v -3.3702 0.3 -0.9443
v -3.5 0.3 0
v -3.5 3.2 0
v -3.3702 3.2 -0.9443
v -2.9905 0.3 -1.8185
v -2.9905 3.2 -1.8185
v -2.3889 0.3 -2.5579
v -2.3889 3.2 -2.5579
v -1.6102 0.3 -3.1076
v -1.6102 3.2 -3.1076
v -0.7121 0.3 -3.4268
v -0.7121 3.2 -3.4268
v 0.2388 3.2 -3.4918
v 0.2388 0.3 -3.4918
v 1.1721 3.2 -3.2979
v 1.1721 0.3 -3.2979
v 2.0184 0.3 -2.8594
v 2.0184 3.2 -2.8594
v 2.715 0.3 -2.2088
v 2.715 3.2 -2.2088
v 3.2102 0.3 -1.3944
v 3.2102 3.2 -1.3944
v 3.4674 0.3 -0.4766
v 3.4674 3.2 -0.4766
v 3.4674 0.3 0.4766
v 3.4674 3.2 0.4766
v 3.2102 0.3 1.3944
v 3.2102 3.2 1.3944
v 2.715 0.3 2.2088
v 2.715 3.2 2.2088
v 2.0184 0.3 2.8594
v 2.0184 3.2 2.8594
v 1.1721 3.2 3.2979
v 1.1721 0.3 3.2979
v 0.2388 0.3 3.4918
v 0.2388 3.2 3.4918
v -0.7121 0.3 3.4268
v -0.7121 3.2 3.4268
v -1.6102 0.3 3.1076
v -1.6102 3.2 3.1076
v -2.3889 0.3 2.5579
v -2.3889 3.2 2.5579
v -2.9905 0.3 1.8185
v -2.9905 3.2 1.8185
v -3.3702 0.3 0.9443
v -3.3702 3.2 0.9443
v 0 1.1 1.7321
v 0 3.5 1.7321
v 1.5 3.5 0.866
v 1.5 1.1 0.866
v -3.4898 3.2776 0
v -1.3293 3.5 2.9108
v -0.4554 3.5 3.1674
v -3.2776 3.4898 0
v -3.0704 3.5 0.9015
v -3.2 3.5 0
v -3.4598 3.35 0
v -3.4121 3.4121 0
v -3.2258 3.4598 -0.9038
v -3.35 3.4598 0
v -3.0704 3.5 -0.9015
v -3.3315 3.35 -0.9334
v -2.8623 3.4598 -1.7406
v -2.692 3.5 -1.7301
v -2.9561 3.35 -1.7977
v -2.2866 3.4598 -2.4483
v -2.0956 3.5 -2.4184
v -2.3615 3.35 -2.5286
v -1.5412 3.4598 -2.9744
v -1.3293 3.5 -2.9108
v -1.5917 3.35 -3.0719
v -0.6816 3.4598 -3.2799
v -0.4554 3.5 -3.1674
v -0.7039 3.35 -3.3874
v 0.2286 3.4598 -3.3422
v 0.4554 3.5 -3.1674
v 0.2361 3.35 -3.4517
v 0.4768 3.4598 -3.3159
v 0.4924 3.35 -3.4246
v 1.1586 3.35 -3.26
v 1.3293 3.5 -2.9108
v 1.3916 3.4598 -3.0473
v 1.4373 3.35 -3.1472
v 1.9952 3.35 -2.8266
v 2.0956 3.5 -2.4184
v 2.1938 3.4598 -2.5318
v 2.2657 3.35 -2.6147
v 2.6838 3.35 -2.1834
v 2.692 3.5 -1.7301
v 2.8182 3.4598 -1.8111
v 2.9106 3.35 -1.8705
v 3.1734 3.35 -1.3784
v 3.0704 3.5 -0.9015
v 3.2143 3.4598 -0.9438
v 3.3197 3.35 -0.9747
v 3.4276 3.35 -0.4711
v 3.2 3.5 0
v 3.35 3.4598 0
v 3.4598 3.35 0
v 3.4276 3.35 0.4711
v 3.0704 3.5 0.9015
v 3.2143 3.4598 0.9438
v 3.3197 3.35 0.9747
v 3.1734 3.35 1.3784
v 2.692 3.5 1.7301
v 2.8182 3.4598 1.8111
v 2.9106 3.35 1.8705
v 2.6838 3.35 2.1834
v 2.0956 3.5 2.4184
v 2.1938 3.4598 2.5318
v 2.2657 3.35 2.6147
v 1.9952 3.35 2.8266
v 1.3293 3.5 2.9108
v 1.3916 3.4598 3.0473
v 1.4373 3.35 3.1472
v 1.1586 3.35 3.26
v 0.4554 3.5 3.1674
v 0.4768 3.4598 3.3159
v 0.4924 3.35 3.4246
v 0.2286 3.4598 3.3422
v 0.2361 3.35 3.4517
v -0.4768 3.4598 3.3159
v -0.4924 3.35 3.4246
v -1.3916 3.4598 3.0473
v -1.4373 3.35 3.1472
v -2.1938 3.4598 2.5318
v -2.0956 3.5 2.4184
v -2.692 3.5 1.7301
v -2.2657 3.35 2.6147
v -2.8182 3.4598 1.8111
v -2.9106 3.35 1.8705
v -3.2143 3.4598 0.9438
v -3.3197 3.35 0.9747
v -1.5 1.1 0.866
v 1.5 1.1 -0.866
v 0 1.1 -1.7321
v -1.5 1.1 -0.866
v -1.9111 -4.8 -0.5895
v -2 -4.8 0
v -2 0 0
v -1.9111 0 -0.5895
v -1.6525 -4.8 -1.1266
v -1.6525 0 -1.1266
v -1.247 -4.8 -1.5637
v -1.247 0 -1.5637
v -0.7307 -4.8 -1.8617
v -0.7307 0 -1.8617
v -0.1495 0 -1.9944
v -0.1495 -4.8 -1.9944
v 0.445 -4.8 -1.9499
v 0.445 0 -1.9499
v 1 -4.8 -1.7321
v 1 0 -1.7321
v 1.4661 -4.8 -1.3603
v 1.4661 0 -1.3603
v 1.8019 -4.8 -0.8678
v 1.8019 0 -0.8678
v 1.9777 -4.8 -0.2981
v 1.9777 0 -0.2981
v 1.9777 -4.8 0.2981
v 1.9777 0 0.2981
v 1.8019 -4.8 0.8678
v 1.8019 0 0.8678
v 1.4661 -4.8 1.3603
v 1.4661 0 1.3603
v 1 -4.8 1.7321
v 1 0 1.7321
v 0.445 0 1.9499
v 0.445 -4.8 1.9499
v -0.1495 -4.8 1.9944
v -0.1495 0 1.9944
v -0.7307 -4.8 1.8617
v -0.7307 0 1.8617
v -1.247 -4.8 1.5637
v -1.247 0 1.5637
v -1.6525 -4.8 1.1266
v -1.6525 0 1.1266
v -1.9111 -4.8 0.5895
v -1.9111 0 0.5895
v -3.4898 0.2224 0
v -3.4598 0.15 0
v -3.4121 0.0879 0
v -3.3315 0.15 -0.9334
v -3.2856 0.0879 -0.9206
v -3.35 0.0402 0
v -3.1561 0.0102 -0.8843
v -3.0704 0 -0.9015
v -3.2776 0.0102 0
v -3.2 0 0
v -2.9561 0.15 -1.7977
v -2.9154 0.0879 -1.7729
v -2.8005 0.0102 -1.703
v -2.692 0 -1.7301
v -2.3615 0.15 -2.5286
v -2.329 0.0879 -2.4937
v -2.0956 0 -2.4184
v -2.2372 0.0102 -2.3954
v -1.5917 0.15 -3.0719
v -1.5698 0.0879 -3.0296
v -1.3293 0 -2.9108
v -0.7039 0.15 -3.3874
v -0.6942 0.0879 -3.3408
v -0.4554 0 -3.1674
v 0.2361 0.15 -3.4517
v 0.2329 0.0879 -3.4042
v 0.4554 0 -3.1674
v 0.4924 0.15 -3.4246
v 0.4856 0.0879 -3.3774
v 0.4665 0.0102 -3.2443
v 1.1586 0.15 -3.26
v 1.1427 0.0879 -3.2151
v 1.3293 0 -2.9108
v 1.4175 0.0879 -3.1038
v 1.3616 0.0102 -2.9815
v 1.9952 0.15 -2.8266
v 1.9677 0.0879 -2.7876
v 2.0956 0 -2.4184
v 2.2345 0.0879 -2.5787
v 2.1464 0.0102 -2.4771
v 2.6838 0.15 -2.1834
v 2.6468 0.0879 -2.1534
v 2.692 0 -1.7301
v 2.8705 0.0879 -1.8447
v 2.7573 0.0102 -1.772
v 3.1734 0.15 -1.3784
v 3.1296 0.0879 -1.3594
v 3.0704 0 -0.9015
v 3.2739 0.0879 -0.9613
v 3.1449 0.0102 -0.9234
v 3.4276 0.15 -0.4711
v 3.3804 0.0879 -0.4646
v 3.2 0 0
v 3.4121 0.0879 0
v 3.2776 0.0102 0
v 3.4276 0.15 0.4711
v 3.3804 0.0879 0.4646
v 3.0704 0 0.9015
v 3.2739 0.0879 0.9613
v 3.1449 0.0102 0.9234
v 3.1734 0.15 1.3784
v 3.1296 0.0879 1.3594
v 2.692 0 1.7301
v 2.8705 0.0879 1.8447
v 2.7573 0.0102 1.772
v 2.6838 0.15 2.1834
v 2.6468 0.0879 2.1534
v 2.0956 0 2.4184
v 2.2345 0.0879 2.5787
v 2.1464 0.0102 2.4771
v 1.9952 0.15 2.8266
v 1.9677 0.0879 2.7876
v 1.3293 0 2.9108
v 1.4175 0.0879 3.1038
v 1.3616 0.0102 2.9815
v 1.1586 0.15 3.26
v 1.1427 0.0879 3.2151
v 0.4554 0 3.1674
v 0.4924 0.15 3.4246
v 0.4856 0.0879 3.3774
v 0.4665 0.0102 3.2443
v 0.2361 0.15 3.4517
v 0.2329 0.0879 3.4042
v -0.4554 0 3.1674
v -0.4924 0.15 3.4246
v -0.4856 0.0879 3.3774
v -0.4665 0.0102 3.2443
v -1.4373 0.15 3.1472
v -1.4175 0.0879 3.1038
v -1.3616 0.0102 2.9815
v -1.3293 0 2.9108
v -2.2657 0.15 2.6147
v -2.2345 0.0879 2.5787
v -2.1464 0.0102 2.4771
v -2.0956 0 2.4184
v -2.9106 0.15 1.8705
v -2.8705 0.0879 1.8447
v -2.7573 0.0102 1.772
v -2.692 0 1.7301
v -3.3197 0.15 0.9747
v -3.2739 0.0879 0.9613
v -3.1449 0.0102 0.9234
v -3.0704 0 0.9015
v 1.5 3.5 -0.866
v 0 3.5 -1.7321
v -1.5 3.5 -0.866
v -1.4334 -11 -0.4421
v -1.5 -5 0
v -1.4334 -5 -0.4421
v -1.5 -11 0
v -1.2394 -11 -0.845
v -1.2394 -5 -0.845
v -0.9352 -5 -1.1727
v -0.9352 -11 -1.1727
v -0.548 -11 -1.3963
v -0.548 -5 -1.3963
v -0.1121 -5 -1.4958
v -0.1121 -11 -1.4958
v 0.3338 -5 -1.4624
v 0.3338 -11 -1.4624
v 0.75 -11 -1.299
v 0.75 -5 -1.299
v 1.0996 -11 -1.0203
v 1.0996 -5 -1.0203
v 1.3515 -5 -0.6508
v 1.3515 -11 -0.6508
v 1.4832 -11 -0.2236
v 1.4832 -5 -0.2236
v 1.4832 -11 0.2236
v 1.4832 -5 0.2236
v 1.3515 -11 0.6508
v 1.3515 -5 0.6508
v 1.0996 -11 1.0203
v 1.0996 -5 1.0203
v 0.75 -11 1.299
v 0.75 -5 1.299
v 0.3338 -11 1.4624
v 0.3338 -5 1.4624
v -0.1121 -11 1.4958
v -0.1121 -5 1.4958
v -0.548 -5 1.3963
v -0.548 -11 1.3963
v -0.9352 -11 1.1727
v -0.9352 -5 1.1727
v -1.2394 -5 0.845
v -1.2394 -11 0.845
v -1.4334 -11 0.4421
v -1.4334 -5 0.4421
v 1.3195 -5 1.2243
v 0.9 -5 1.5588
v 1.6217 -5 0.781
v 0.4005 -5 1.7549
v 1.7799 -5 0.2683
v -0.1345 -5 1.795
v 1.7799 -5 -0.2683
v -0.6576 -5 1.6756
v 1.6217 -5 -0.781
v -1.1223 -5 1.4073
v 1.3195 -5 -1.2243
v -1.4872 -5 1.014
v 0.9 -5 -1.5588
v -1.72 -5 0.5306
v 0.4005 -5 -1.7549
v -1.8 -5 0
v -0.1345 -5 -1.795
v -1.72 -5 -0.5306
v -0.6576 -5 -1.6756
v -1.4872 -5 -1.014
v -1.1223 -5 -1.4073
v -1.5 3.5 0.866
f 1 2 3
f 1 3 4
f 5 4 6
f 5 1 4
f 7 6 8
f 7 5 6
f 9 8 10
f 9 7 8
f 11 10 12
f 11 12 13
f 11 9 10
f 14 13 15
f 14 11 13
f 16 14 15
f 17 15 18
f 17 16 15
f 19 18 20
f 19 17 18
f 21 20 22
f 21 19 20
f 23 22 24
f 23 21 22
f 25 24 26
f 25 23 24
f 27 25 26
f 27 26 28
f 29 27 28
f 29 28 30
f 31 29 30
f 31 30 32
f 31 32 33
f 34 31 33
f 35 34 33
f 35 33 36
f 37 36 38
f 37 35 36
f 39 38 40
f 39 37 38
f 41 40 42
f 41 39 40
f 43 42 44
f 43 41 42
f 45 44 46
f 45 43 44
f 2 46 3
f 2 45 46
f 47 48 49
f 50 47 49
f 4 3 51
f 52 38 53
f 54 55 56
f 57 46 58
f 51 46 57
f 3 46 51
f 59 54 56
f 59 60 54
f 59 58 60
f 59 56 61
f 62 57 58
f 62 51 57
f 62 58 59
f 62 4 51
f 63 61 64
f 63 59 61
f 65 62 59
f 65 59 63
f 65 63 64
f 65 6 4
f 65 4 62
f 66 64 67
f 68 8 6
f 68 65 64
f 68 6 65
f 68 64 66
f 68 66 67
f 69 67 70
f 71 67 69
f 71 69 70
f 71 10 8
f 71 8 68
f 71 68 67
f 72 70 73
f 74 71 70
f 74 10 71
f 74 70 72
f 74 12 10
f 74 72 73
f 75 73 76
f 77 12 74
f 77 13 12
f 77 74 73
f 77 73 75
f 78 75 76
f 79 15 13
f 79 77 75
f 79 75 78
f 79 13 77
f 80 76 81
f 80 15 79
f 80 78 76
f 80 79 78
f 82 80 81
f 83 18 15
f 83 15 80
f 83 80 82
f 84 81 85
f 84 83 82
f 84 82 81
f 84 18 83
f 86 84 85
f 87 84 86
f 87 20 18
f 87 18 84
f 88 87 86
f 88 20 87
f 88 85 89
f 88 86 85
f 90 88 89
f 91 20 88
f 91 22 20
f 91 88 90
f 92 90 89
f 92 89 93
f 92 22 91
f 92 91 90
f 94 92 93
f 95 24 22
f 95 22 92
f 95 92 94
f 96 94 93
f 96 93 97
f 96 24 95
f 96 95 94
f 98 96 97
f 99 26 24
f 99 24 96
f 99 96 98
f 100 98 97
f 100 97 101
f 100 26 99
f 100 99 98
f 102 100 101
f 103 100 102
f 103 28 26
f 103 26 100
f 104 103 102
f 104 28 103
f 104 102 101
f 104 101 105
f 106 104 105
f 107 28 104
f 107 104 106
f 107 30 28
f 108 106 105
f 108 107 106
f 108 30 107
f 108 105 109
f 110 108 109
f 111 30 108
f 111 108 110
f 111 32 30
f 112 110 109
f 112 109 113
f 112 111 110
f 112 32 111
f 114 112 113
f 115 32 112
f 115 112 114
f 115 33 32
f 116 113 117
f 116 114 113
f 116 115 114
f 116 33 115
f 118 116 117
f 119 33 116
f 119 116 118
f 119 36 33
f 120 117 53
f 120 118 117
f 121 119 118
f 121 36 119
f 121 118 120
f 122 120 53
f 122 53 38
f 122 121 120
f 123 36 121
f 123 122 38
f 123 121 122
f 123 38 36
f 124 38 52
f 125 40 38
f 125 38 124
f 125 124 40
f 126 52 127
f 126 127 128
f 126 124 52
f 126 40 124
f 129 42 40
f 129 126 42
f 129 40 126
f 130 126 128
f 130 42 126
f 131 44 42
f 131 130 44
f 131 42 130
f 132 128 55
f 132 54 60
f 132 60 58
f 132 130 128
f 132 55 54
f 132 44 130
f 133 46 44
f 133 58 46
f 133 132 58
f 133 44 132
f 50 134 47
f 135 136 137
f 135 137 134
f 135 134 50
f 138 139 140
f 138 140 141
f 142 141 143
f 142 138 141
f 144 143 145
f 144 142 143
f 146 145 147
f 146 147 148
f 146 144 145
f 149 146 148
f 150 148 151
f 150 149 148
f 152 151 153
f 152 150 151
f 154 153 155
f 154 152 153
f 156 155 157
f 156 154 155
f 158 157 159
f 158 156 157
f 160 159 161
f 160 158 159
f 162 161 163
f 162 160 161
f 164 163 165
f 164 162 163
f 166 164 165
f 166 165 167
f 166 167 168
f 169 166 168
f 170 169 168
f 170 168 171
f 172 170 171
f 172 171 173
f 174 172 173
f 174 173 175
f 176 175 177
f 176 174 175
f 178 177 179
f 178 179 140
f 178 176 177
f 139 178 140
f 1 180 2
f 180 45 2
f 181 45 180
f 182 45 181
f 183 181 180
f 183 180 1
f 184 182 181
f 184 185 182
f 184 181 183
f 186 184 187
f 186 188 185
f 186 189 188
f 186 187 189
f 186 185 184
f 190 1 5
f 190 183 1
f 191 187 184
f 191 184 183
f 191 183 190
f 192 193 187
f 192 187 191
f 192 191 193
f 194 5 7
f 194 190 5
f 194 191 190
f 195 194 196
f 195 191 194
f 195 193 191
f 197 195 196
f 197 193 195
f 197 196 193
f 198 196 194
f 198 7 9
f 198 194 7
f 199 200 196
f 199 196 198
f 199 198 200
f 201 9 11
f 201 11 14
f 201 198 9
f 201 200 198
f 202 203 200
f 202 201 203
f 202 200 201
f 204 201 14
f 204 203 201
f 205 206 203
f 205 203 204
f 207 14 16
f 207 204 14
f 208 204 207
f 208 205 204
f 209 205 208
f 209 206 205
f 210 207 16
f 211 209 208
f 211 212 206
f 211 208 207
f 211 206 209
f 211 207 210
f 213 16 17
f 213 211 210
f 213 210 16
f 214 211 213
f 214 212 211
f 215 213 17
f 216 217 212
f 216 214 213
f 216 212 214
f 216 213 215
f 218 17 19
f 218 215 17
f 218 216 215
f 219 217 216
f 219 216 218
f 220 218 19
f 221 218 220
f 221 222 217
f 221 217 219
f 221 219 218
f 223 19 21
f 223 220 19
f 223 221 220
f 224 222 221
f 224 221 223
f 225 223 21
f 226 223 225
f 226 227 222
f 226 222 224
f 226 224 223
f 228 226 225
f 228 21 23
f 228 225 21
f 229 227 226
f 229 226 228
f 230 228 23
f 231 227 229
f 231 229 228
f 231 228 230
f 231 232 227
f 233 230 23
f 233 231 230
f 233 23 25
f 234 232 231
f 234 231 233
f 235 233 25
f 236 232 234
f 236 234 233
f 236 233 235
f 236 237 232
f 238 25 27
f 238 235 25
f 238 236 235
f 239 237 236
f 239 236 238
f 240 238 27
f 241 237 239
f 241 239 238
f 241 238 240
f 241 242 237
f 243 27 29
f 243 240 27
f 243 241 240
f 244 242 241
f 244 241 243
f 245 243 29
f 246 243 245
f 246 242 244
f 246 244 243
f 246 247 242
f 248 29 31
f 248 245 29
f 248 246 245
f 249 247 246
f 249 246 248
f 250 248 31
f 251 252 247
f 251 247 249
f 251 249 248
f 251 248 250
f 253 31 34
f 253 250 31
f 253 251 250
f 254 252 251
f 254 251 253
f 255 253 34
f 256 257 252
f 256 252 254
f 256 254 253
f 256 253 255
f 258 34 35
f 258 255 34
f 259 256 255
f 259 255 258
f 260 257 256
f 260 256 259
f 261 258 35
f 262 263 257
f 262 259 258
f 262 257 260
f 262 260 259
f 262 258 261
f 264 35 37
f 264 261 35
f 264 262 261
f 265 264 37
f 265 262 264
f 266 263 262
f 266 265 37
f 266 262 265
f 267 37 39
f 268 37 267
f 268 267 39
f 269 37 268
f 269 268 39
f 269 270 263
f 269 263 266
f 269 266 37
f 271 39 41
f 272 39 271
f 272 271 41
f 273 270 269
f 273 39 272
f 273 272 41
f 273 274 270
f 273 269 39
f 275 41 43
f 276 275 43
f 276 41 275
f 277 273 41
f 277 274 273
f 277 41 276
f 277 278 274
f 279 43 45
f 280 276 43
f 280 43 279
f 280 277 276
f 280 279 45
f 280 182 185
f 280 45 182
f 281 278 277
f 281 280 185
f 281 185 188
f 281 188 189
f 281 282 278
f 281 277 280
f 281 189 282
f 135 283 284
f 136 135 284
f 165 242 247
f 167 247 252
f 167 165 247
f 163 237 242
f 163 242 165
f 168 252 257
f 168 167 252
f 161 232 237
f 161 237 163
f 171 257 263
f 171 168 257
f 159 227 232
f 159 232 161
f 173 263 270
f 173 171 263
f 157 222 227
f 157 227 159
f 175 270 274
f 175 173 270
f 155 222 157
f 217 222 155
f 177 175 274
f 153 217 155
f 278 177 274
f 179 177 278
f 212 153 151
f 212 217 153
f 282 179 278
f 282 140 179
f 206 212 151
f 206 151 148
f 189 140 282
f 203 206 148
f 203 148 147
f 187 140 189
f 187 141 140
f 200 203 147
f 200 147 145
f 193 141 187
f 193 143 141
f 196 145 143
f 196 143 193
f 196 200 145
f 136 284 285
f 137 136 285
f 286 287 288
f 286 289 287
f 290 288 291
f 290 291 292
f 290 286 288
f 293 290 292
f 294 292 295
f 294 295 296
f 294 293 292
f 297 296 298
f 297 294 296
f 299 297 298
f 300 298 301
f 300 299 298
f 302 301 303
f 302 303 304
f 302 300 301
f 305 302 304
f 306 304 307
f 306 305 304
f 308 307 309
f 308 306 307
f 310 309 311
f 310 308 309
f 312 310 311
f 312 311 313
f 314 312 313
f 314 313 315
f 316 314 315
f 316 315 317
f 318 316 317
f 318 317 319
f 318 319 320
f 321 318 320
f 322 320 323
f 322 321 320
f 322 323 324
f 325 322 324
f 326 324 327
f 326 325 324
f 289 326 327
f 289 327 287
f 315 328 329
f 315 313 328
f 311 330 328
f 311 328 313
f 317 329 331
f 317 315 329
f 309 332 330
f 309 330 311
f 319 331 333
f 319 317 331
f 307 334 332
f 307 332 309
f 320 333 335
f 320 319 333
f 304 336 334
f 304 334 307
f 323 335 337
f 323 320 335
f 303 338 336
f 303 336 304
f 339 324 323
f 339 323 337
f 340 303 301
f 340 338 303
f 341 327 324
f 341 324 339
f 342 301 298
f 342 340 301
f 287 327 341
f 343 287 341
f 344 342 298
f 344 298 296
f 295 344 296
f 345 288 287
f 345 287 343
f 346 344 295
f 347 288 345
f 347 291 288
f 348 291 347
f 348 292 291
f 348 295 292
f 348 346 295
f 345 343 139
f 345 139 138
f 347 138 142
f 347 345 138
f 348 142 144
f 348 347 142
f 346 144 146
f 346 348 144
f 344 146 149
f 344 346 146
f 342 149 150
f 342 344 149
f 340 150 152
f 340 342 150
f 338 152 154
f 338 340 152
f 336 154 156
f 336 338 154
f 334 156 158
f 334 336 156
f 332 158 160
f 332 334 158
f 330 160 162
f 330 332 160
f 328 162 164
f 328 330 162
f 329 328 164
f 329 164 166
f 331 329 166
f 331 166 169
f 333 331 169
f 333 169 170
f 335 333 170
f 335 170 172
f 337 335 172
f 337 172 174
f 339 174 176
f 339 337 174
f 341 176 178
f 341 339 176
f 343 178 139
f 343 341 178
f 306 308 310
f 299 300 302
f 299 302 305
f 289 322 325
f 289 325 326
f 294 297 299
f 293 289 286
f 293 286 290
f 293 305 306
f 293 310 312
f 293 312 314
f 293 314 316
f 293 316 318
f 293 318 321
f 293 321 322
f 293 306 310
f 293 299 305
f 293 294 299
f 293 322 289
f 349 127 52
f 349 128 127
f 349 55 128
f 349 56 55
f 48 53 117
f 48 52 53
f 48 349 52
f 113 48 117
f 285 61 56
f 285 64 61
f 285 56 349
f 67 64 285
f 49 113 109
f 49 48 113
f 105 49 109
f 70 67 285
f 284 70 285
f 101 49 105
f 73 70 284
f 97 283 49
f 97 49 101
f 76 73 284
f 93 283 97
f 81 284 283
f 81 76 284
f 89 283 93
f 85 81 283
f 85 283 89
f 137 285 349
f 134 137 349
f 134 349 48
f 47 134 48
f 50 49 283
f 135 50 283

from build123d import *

# Parameters (mm, degrees)
FILLET1_R          = 0.3
CUT_EXTRUDE1_DEPTH = 2.4
CHAMFER1_SIZE      = 0.2


with BuildPart() as part:
    # Sketch1 → Revolve1 (revolve)
    with BuildSketch(Plane.XY):
        Polygon((0, 3.5), (-3.5, 3.5), (-3.5, 0), (-2, 0), (-2, -5), (-1.5, -5), (-1.5, -11), (0, -11), align=None)
    revolve(axis=Axis((0, 3.5, 0), (0, -1, 0)))

    # Fillet1
    fillet1_edges = [part.edges().sort_by_distance(p)[0] for p in [
        (3.5, 0, 0),
        (3.5, 3.5, 0),
    ]]
    fillet(fillet1_edges, radius=FILLET1_R)

    # Sketch2 → Cut-Extrude1 (cut)
    with BuildSketch(Plane(origin=(0, 3.5, 0), x_dir=(1, 0, 0), z_dir=(0, 1, 0))):
        Polygon((1.5, 0.866025404), (0, 1.732050808), (-1.5, 0.866025404), (-1.5, -0.866025404), (0, -1.732050808), (1.5, -0.866025404), align=None)
    extrude(amount=-CUT_EXTRUDE1_DEPTH, mode=Mode.SUBTRACT)

    # Chamfer1
    chamfer1_edges = [part.edges().sort_by_distance(p)[0] for p in [
        (2, -5, 0),
    ]]
    chamfer(chamfer1_edges, length=CHAMFER1_SIZE)


solid = part.part
